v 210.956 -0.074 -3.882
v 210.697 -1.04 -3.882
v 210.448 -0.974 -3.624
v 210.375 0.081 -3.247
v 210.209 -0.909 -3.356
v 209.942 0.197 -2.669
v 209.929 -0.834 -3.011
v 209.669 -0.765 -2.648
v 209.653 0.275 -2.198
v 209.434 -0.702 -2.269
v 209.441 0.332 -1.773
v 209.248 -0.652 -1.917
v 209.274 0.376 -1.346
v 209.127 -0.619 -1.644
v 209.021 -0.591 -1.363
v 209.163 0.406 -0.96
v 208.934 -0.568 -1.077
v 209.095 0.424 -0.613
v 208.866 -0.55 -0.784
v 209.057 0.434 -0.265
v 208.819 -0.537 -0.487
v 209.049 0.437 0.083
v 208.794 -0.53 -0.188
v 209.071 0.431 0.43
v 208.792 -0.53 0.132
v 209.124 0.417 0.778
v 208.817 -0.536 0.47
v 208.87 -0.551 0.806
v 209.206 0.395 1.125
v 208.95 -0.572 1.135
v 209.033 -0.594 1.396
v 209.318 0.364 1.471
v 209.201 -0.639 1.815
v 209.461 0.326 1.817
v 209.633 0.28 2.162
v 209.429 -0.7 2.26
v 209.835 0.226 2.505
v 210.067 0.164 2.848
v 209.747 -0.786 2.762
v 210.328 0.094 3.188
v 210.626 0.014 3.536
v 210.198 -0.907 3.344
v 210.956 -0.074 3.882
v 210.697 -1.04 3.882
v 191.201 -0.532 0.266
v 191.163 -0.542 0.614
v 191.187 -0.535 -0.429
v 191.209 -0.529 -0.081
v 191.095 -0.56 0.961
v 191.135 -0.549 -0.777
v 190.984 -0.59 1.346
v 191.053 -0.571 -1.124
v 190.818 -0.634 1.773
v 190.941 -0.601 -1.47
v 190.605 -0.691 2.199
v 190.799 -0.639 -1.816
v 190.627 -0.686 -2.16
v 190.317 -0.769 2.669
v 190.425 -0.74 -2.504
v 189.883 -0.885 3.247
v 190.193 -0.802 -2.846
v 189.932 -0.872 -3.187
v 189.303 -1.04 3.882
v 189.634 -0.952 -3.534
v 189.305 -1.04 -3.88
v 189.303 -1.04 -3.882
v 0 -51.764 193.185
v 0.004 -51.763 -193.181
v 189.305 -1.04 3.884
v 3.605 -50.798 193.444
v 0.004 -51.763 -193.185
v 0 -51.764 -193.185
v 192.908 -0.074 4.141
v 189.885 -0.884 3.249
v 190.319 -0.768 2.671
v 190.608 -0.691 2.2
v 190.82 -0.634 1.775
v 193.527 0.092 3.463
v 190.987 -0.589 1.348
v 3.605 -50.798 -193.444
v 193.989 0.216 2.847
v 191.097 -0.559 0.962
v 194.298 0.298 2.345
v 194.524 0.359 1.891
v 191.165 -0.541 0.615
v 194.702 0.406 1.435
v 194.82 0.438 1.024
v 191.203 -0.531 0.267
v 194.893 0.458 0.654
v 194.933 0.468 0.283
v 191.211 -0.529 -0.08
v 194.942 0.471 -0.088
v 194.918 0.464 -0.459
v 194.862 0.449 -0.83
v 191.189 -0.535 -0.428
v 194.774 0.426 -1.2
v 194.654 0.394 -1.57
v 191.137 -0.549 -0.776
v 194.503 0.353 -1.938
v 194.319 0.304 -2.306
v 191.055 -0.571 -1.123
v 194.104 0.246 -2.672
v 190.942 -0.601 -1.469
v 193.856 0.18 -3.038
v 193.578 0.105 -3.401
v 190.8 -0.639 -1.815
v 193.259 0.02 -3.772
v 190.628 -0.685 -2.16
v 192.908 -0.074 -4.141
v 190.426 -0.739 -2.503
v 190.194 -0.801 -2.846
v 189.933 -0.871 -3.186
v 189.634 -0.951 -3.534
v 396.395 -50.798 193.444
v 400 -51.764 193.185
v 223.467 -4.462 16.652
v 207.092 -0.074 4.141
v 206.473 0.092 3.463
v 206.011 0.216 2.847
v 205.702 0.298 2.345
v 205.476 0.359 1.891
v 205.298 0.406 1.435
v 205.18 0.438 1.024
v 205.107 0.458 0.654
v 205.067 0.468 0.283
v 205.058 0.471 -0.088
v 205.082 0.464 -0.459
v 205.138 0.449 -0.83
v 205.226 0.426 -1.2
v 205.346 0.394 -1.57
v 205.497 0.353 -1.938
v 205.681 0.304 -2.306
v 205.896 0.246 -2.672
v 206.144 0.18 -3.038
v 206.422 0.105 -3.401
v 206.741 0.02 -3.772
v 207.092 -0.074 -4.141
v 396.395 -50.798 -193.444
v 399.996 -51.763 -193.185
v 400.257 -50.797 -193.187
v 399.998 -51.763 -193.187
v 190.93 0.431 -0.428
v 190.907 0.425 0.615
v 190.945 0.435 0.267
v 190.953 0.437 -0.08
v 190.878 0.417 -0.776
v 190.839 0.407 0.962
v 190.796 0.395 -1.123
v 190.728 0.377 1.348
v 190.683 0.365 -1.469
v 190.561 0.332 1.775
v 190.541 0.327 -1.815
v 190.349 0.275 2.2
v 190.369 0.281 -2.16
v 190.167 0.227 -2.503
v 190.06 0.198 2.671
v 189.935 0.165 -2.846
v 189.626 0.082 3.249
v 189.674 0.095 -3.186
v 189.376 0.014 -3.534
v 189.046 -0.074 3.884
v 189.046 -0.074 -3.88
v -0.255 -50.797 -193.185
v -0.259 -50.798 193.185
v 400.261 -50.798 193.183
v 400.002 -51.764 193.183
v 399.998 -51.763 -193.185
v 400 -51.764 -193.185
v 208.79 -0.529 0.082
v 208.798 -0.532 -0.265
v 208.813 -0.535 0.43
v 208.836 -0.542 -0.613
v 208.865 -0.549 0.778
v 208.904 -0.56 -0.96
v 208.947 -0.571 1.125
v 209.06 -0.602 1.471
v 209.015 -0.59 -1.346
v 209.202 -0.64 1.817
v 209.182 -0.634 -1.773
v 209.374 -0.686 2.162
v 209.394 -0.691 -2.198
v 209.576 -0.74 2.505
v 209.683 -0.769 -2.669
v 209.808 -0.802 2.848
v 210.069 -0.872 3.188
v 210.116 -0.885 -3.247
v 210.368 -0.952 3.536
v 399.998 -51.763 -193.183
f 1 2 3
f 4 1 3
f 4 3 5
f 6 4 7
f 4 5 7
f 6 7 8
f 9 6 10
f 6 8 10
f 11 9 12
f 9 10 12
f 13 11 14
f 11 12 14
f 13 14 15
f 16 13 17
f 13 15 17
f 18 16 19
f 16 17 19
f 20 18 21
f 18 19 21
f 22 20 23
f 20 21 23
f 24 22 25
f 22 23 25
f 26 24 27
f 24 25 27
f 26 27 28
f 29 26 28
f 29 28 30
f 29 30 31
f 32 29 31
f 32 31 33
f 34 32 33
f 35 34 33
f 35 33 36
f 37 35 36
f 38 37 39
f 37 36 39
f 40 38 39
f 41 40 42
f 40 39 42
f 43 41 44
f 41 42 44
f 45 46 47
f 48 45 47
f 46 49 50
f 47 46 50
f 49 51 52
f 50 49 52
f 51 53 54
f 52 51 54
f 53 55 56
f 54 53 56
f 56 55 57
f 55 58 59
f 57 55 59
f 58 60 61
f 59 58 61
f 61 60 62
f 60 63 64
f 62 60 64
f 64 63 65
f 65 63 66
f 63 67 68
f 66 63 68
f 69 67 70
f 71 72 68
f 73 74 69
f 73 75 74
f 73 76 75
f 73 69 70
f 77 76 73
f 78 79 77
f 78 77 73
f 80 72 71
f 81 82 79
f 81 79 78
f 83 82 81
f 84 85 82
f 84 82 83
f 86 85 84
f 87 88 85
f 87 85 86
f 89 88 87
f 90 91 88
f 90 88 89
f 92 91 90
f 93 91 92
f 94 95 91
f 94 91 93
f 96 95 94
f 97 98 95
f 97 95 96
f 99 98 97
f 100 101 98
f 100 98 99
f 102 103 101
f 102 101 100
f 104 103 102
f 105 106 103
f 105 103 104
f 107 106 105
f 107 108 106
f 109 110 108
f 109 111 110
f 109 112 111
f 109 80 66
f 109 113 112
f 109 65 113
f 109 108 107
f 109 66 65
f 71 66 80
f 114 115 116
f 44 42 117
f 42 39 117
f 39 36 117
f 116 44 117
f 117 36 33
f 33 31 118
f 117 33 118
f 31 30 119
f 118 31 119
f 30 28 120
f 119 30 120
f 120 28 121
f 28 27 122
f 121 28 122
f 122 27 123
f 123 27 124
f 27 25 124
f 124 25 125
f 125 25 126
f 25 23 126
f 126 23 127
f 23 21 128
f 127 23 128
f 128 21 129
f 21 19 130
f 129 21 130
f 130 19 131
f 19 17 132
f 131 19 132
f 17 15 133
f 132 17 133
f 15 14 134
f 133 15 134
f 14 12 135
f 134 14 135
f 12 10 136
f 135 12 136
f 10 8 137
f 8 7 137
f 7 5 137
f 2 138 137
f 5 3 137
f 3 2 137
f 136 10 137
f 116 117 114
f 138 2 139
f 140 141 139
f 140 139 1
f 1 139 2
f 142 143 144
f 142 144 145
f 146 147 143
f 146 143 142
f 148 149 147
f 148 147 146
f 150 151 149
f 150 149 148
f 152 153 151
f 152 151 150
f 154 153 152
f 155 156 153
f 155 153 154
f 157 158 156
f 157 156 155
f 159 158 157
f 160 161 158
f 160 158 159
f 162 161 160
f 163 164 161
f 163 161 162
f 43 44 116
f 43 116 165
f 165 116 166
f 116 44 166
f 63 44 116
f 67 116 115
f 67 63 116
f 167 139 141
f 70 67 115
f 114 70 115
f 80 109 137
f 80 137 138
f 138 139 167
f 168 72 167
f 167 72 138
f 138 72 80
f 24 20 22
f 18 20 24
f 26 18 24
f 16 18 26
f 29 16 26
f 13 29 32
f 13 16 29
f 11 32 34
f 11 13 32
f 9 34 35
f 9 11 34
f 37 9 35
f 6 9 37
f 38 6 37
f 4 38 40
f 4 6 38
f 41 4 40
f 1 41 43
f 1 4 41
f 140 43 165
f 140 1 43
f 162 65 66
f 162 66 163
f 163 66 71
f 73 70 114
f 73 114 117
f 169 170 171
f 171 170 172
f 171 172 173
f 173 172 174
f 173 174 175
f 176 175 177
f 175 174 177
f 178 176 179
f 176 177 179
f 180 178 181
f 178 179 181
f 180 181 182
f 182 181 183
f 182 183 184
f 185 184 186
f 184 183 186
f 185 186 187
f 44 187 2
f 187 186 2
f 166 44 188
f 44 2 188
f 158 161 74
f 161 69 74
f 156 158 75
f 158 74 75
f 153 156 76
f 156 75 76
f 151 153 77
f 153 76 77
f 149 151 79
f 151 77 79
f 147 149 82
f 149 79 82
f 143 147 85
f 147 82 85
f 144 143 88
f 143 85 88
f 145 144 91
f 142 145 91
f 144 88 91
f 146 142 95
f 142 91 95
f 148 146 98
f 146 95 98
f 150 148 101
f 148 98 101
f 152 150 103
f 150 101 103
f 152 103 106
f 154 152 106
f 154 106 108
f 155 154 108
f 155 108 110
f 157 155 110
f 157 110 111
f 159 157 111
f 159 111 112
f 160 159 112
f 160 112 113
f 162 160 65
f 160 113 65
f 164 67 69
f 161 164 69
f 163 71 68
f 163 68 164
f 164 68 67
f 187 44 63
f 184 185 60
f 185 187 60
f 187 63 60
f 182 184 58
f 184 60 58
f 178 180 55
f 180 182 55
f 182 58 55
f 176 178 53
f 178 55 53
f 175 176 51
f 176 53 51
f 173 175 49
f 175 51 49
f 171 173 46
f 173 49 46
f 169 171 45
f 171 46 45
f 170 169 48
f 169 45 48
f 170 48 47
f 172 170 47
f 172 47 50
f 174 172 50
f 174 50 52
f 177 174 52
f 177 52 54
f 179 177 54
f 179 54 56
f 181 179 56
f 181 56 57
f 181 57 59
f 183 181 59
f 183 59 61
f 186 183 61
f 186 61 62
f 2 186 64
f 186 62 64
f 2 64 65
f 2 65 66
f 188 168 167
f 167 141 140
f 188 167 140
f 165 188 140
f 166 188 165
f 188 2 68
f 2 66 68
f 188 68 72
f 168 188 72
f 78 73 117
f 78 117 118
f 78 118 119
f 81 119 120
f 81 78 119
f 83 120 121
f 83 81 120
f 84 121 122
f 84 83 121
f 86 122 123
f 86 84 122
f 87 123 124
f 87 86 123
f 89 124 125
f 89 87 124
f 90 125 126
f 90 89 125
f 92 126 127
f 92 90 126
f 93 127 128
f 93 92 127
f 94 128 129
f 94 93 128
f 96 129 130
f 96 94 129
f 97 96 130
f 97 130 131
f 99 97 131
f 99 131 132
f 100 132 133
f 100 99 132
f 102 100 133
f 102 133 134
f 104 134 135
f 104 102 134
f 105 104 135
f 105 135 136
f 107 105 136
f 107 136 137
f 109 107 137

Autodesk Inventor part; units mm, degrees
ref_plane "YZ Plane" through (0, 0, 0) normal (1, 0, 0) x (0, 1, 0)
ref_plane "XZ Plane" through (0, 0, 0) normal (0, 1, 0) x (-1, 0, 0)
ref_plane "XY Plane" through (0, 0, 0) normal (0, 0, 1) x (1, 0, 0)
sketch "Sketch20" plane through (0, 0, 0) normal (1, 0, 0) x (0, 1, 0)
  line L0 (-1.0403, 3.8823) -> (-51.7638, 193.1852)
  line L1 (0, 0) -> (195.9808, 0) construction
  line L2 (-1.0403, -3.8823) -> (-51.7638, -193.1852)
  line L3 (0, 0) -> (200, 0) construction
  arc A0 (-1.0403, -3.8823) -> (-1.0403, 3.8823) centre (-15.5291, 0) ccw
  line L4 (-50.7979, 193.444) -> (-0.0743, 4.1411)
  arc A1 (-0.0743, -4.1411) -> (-0.0743, 4.1411) centre (-15.5291, 0) ccw
  line L5 (-0.0743, -4.1411) -> (-50.7979, -193.444)
  line L6 (-50.7979, 193.444) -> (-51.7638, 193.1852)
  line L7 (-50.7979, -193.444) -> (-51.7638, -193.1852)
  dimension "d97" = 90
  dimension "d81" = 200
  dimension "d82" = 105
  dimension "d83" = 200
  dimension "d84" = 105
  dimension "d85" = 15
  dimension "d86" = 1
  dimension "d87" = 90
  dimension "d88" = 90
extrude "Extrusion7" add sketch "Sketch20" along normal blind 400
sketch "Sketch21" plane through (0, 0, 0) normal (0, 0, 1) x (1, 0, 0)
  line L0 (0, -51.7638) -> (0, -1.0403) projected
  line L1 (0, -51.7638) -> (196.1177, 0.7858)
  line L2 (0, -51.7638) -> (210, -51.7638) construction
  line L3 (400, -50.7979) -> (400, -51.7638) projected
  line L4 (400, -51.7638) -> (203.8823, 0.7858)
  line L5 (400, -51.7638) -> (610, -51.7638) construction
  arc A0 (203.8823, 0.7858) -> (196.1177, 0.7858) centre (200, -13.7031) ccw
  line L6 (400, -51.7638) -> (400, 8.2362)
  line L7 (400, -0.0743) -> (400, -50.7979) projected
  line L8 (400, -51.7638) -> (460, -51.7638) construction
  line L9 (0, -51.7638) -> (0, 8.2362)
  line L10 (400, 8.2362) -> (0, 8.2362)
  point P0 (0, 0)
  dimension "d92" = 15
  dimension "d94" = 165
  dimension "d95" = 15
  dimension "d96" = 60
  dimension "d97" = 90
extrude "Extrusion8" cut sketch "Sketch21" along normal through all both and the other way through all
sketch "Sketch22" plane through (210.6971, -1.0403, 3.8823) normal (0.2588, 0.9659, 0) x (0.6947, -0.1862, 0.6947)
  line L0 (272.4776, 0) -> (269.9731, -2.779) projected
  line L1 (0, 0) -> (272.4776, 0) projected
  ellipse E0 centre (37.5672, 41.6848) end of major axis (79.252, 81.9492) minor radius 15 (-5.3944, 5.5847) -> (0, 0) ccw projected
  line L2 (4.0481, 277.8986) -> (-5.3944, 5.5847) projected
  line L3 (1.184, 275.492) -> (4.0481, 277.8986) projected
  line L4 (-8.2585, 3.178) -> (1.184, 275.492) projected
  ellipse E1 centre (37.5672, 41.6848) end of major axis (-6.8966, -1.2639) minor radius 16 (-8.2585, 3.178) -> (-2.5045, -2.779) ccw projected
  line L5 (269.9731, -2.779) -> (-2.5045, -2.779) projected
  line L6 (4.0481, 277.8986) -> (-5.3944, 5.5847) projected
  line L7 (4.0481, 277.8986) -> (272.4776, 0)
  point P0 (-149.272, -138.788)
extrude "Extrusion9" add sketch "Sketch22" along normal blind 1 contours L1 E0 L2 L7
sketch "Sketch24" plane through (0, -51.7638, 193.1852) normal (-0.2588, 0.9659, 0) x (0.6947, 0.1862, -0.6947)
  line L0 (0, 0) -> (272.4776, 0) projected
  line L1 (2.5045, -2.779) -> (0, 0) projected
  line L2 (274.9821, -2.779) -> (2.5045, -2.779) projected
  ellipse E0 centre (234.9104, 41.6848) end of major axis (279.3742, -1.2639) minor radius 16 (274.9821, -2.779) -> (280.7361, 3.178) ccw projected
  line L3 (271.2936, 275.492) -> (280.7361, 3.178) projected
  line L4 (268.4295, 277.8986) -> (271.2936, 275.492) projected
  line L5 (277.872, 5.5847) -> (268.4295, 277.8986) projected
  ellipse E1 centre (234.9104, 41.6848) end of major axis (193.2256, 81.9492) minor radius 15 (272.4776, 0) -> (277.872, 5.5847) ccw projected
  line L6 (277.872, 5.5847) -> (268.4295, 277.8986) projected
  line L7 (268.4295, 277.8986) -> (0, 0)
  point P0 (143.8509, 129.6415)
extrude "Extrusion10" add sketch "Sketch24" along normal blind 1 contours L7 L5 E1 L0
equation "\"BendRadius\" = Thickness"
equation "\"BendReliefWidth\" = Thickness"
equation "\"BendReliefDepth\" = 0.5 * Thickness"
equation "\"CornerReliefSize\" = 4 * Thickness"
equation "\"MinimumRemnant\" = 2 * Thickness"
equation "\"TransitionRadius\" = BendRadius"
equation "\"JacobiRadiusSize\" = Thickness"
equation "\"GapSize\" = Thickness"
equation "\"Thickness\" = 0.5"
properties part number "chimneyRoof"
